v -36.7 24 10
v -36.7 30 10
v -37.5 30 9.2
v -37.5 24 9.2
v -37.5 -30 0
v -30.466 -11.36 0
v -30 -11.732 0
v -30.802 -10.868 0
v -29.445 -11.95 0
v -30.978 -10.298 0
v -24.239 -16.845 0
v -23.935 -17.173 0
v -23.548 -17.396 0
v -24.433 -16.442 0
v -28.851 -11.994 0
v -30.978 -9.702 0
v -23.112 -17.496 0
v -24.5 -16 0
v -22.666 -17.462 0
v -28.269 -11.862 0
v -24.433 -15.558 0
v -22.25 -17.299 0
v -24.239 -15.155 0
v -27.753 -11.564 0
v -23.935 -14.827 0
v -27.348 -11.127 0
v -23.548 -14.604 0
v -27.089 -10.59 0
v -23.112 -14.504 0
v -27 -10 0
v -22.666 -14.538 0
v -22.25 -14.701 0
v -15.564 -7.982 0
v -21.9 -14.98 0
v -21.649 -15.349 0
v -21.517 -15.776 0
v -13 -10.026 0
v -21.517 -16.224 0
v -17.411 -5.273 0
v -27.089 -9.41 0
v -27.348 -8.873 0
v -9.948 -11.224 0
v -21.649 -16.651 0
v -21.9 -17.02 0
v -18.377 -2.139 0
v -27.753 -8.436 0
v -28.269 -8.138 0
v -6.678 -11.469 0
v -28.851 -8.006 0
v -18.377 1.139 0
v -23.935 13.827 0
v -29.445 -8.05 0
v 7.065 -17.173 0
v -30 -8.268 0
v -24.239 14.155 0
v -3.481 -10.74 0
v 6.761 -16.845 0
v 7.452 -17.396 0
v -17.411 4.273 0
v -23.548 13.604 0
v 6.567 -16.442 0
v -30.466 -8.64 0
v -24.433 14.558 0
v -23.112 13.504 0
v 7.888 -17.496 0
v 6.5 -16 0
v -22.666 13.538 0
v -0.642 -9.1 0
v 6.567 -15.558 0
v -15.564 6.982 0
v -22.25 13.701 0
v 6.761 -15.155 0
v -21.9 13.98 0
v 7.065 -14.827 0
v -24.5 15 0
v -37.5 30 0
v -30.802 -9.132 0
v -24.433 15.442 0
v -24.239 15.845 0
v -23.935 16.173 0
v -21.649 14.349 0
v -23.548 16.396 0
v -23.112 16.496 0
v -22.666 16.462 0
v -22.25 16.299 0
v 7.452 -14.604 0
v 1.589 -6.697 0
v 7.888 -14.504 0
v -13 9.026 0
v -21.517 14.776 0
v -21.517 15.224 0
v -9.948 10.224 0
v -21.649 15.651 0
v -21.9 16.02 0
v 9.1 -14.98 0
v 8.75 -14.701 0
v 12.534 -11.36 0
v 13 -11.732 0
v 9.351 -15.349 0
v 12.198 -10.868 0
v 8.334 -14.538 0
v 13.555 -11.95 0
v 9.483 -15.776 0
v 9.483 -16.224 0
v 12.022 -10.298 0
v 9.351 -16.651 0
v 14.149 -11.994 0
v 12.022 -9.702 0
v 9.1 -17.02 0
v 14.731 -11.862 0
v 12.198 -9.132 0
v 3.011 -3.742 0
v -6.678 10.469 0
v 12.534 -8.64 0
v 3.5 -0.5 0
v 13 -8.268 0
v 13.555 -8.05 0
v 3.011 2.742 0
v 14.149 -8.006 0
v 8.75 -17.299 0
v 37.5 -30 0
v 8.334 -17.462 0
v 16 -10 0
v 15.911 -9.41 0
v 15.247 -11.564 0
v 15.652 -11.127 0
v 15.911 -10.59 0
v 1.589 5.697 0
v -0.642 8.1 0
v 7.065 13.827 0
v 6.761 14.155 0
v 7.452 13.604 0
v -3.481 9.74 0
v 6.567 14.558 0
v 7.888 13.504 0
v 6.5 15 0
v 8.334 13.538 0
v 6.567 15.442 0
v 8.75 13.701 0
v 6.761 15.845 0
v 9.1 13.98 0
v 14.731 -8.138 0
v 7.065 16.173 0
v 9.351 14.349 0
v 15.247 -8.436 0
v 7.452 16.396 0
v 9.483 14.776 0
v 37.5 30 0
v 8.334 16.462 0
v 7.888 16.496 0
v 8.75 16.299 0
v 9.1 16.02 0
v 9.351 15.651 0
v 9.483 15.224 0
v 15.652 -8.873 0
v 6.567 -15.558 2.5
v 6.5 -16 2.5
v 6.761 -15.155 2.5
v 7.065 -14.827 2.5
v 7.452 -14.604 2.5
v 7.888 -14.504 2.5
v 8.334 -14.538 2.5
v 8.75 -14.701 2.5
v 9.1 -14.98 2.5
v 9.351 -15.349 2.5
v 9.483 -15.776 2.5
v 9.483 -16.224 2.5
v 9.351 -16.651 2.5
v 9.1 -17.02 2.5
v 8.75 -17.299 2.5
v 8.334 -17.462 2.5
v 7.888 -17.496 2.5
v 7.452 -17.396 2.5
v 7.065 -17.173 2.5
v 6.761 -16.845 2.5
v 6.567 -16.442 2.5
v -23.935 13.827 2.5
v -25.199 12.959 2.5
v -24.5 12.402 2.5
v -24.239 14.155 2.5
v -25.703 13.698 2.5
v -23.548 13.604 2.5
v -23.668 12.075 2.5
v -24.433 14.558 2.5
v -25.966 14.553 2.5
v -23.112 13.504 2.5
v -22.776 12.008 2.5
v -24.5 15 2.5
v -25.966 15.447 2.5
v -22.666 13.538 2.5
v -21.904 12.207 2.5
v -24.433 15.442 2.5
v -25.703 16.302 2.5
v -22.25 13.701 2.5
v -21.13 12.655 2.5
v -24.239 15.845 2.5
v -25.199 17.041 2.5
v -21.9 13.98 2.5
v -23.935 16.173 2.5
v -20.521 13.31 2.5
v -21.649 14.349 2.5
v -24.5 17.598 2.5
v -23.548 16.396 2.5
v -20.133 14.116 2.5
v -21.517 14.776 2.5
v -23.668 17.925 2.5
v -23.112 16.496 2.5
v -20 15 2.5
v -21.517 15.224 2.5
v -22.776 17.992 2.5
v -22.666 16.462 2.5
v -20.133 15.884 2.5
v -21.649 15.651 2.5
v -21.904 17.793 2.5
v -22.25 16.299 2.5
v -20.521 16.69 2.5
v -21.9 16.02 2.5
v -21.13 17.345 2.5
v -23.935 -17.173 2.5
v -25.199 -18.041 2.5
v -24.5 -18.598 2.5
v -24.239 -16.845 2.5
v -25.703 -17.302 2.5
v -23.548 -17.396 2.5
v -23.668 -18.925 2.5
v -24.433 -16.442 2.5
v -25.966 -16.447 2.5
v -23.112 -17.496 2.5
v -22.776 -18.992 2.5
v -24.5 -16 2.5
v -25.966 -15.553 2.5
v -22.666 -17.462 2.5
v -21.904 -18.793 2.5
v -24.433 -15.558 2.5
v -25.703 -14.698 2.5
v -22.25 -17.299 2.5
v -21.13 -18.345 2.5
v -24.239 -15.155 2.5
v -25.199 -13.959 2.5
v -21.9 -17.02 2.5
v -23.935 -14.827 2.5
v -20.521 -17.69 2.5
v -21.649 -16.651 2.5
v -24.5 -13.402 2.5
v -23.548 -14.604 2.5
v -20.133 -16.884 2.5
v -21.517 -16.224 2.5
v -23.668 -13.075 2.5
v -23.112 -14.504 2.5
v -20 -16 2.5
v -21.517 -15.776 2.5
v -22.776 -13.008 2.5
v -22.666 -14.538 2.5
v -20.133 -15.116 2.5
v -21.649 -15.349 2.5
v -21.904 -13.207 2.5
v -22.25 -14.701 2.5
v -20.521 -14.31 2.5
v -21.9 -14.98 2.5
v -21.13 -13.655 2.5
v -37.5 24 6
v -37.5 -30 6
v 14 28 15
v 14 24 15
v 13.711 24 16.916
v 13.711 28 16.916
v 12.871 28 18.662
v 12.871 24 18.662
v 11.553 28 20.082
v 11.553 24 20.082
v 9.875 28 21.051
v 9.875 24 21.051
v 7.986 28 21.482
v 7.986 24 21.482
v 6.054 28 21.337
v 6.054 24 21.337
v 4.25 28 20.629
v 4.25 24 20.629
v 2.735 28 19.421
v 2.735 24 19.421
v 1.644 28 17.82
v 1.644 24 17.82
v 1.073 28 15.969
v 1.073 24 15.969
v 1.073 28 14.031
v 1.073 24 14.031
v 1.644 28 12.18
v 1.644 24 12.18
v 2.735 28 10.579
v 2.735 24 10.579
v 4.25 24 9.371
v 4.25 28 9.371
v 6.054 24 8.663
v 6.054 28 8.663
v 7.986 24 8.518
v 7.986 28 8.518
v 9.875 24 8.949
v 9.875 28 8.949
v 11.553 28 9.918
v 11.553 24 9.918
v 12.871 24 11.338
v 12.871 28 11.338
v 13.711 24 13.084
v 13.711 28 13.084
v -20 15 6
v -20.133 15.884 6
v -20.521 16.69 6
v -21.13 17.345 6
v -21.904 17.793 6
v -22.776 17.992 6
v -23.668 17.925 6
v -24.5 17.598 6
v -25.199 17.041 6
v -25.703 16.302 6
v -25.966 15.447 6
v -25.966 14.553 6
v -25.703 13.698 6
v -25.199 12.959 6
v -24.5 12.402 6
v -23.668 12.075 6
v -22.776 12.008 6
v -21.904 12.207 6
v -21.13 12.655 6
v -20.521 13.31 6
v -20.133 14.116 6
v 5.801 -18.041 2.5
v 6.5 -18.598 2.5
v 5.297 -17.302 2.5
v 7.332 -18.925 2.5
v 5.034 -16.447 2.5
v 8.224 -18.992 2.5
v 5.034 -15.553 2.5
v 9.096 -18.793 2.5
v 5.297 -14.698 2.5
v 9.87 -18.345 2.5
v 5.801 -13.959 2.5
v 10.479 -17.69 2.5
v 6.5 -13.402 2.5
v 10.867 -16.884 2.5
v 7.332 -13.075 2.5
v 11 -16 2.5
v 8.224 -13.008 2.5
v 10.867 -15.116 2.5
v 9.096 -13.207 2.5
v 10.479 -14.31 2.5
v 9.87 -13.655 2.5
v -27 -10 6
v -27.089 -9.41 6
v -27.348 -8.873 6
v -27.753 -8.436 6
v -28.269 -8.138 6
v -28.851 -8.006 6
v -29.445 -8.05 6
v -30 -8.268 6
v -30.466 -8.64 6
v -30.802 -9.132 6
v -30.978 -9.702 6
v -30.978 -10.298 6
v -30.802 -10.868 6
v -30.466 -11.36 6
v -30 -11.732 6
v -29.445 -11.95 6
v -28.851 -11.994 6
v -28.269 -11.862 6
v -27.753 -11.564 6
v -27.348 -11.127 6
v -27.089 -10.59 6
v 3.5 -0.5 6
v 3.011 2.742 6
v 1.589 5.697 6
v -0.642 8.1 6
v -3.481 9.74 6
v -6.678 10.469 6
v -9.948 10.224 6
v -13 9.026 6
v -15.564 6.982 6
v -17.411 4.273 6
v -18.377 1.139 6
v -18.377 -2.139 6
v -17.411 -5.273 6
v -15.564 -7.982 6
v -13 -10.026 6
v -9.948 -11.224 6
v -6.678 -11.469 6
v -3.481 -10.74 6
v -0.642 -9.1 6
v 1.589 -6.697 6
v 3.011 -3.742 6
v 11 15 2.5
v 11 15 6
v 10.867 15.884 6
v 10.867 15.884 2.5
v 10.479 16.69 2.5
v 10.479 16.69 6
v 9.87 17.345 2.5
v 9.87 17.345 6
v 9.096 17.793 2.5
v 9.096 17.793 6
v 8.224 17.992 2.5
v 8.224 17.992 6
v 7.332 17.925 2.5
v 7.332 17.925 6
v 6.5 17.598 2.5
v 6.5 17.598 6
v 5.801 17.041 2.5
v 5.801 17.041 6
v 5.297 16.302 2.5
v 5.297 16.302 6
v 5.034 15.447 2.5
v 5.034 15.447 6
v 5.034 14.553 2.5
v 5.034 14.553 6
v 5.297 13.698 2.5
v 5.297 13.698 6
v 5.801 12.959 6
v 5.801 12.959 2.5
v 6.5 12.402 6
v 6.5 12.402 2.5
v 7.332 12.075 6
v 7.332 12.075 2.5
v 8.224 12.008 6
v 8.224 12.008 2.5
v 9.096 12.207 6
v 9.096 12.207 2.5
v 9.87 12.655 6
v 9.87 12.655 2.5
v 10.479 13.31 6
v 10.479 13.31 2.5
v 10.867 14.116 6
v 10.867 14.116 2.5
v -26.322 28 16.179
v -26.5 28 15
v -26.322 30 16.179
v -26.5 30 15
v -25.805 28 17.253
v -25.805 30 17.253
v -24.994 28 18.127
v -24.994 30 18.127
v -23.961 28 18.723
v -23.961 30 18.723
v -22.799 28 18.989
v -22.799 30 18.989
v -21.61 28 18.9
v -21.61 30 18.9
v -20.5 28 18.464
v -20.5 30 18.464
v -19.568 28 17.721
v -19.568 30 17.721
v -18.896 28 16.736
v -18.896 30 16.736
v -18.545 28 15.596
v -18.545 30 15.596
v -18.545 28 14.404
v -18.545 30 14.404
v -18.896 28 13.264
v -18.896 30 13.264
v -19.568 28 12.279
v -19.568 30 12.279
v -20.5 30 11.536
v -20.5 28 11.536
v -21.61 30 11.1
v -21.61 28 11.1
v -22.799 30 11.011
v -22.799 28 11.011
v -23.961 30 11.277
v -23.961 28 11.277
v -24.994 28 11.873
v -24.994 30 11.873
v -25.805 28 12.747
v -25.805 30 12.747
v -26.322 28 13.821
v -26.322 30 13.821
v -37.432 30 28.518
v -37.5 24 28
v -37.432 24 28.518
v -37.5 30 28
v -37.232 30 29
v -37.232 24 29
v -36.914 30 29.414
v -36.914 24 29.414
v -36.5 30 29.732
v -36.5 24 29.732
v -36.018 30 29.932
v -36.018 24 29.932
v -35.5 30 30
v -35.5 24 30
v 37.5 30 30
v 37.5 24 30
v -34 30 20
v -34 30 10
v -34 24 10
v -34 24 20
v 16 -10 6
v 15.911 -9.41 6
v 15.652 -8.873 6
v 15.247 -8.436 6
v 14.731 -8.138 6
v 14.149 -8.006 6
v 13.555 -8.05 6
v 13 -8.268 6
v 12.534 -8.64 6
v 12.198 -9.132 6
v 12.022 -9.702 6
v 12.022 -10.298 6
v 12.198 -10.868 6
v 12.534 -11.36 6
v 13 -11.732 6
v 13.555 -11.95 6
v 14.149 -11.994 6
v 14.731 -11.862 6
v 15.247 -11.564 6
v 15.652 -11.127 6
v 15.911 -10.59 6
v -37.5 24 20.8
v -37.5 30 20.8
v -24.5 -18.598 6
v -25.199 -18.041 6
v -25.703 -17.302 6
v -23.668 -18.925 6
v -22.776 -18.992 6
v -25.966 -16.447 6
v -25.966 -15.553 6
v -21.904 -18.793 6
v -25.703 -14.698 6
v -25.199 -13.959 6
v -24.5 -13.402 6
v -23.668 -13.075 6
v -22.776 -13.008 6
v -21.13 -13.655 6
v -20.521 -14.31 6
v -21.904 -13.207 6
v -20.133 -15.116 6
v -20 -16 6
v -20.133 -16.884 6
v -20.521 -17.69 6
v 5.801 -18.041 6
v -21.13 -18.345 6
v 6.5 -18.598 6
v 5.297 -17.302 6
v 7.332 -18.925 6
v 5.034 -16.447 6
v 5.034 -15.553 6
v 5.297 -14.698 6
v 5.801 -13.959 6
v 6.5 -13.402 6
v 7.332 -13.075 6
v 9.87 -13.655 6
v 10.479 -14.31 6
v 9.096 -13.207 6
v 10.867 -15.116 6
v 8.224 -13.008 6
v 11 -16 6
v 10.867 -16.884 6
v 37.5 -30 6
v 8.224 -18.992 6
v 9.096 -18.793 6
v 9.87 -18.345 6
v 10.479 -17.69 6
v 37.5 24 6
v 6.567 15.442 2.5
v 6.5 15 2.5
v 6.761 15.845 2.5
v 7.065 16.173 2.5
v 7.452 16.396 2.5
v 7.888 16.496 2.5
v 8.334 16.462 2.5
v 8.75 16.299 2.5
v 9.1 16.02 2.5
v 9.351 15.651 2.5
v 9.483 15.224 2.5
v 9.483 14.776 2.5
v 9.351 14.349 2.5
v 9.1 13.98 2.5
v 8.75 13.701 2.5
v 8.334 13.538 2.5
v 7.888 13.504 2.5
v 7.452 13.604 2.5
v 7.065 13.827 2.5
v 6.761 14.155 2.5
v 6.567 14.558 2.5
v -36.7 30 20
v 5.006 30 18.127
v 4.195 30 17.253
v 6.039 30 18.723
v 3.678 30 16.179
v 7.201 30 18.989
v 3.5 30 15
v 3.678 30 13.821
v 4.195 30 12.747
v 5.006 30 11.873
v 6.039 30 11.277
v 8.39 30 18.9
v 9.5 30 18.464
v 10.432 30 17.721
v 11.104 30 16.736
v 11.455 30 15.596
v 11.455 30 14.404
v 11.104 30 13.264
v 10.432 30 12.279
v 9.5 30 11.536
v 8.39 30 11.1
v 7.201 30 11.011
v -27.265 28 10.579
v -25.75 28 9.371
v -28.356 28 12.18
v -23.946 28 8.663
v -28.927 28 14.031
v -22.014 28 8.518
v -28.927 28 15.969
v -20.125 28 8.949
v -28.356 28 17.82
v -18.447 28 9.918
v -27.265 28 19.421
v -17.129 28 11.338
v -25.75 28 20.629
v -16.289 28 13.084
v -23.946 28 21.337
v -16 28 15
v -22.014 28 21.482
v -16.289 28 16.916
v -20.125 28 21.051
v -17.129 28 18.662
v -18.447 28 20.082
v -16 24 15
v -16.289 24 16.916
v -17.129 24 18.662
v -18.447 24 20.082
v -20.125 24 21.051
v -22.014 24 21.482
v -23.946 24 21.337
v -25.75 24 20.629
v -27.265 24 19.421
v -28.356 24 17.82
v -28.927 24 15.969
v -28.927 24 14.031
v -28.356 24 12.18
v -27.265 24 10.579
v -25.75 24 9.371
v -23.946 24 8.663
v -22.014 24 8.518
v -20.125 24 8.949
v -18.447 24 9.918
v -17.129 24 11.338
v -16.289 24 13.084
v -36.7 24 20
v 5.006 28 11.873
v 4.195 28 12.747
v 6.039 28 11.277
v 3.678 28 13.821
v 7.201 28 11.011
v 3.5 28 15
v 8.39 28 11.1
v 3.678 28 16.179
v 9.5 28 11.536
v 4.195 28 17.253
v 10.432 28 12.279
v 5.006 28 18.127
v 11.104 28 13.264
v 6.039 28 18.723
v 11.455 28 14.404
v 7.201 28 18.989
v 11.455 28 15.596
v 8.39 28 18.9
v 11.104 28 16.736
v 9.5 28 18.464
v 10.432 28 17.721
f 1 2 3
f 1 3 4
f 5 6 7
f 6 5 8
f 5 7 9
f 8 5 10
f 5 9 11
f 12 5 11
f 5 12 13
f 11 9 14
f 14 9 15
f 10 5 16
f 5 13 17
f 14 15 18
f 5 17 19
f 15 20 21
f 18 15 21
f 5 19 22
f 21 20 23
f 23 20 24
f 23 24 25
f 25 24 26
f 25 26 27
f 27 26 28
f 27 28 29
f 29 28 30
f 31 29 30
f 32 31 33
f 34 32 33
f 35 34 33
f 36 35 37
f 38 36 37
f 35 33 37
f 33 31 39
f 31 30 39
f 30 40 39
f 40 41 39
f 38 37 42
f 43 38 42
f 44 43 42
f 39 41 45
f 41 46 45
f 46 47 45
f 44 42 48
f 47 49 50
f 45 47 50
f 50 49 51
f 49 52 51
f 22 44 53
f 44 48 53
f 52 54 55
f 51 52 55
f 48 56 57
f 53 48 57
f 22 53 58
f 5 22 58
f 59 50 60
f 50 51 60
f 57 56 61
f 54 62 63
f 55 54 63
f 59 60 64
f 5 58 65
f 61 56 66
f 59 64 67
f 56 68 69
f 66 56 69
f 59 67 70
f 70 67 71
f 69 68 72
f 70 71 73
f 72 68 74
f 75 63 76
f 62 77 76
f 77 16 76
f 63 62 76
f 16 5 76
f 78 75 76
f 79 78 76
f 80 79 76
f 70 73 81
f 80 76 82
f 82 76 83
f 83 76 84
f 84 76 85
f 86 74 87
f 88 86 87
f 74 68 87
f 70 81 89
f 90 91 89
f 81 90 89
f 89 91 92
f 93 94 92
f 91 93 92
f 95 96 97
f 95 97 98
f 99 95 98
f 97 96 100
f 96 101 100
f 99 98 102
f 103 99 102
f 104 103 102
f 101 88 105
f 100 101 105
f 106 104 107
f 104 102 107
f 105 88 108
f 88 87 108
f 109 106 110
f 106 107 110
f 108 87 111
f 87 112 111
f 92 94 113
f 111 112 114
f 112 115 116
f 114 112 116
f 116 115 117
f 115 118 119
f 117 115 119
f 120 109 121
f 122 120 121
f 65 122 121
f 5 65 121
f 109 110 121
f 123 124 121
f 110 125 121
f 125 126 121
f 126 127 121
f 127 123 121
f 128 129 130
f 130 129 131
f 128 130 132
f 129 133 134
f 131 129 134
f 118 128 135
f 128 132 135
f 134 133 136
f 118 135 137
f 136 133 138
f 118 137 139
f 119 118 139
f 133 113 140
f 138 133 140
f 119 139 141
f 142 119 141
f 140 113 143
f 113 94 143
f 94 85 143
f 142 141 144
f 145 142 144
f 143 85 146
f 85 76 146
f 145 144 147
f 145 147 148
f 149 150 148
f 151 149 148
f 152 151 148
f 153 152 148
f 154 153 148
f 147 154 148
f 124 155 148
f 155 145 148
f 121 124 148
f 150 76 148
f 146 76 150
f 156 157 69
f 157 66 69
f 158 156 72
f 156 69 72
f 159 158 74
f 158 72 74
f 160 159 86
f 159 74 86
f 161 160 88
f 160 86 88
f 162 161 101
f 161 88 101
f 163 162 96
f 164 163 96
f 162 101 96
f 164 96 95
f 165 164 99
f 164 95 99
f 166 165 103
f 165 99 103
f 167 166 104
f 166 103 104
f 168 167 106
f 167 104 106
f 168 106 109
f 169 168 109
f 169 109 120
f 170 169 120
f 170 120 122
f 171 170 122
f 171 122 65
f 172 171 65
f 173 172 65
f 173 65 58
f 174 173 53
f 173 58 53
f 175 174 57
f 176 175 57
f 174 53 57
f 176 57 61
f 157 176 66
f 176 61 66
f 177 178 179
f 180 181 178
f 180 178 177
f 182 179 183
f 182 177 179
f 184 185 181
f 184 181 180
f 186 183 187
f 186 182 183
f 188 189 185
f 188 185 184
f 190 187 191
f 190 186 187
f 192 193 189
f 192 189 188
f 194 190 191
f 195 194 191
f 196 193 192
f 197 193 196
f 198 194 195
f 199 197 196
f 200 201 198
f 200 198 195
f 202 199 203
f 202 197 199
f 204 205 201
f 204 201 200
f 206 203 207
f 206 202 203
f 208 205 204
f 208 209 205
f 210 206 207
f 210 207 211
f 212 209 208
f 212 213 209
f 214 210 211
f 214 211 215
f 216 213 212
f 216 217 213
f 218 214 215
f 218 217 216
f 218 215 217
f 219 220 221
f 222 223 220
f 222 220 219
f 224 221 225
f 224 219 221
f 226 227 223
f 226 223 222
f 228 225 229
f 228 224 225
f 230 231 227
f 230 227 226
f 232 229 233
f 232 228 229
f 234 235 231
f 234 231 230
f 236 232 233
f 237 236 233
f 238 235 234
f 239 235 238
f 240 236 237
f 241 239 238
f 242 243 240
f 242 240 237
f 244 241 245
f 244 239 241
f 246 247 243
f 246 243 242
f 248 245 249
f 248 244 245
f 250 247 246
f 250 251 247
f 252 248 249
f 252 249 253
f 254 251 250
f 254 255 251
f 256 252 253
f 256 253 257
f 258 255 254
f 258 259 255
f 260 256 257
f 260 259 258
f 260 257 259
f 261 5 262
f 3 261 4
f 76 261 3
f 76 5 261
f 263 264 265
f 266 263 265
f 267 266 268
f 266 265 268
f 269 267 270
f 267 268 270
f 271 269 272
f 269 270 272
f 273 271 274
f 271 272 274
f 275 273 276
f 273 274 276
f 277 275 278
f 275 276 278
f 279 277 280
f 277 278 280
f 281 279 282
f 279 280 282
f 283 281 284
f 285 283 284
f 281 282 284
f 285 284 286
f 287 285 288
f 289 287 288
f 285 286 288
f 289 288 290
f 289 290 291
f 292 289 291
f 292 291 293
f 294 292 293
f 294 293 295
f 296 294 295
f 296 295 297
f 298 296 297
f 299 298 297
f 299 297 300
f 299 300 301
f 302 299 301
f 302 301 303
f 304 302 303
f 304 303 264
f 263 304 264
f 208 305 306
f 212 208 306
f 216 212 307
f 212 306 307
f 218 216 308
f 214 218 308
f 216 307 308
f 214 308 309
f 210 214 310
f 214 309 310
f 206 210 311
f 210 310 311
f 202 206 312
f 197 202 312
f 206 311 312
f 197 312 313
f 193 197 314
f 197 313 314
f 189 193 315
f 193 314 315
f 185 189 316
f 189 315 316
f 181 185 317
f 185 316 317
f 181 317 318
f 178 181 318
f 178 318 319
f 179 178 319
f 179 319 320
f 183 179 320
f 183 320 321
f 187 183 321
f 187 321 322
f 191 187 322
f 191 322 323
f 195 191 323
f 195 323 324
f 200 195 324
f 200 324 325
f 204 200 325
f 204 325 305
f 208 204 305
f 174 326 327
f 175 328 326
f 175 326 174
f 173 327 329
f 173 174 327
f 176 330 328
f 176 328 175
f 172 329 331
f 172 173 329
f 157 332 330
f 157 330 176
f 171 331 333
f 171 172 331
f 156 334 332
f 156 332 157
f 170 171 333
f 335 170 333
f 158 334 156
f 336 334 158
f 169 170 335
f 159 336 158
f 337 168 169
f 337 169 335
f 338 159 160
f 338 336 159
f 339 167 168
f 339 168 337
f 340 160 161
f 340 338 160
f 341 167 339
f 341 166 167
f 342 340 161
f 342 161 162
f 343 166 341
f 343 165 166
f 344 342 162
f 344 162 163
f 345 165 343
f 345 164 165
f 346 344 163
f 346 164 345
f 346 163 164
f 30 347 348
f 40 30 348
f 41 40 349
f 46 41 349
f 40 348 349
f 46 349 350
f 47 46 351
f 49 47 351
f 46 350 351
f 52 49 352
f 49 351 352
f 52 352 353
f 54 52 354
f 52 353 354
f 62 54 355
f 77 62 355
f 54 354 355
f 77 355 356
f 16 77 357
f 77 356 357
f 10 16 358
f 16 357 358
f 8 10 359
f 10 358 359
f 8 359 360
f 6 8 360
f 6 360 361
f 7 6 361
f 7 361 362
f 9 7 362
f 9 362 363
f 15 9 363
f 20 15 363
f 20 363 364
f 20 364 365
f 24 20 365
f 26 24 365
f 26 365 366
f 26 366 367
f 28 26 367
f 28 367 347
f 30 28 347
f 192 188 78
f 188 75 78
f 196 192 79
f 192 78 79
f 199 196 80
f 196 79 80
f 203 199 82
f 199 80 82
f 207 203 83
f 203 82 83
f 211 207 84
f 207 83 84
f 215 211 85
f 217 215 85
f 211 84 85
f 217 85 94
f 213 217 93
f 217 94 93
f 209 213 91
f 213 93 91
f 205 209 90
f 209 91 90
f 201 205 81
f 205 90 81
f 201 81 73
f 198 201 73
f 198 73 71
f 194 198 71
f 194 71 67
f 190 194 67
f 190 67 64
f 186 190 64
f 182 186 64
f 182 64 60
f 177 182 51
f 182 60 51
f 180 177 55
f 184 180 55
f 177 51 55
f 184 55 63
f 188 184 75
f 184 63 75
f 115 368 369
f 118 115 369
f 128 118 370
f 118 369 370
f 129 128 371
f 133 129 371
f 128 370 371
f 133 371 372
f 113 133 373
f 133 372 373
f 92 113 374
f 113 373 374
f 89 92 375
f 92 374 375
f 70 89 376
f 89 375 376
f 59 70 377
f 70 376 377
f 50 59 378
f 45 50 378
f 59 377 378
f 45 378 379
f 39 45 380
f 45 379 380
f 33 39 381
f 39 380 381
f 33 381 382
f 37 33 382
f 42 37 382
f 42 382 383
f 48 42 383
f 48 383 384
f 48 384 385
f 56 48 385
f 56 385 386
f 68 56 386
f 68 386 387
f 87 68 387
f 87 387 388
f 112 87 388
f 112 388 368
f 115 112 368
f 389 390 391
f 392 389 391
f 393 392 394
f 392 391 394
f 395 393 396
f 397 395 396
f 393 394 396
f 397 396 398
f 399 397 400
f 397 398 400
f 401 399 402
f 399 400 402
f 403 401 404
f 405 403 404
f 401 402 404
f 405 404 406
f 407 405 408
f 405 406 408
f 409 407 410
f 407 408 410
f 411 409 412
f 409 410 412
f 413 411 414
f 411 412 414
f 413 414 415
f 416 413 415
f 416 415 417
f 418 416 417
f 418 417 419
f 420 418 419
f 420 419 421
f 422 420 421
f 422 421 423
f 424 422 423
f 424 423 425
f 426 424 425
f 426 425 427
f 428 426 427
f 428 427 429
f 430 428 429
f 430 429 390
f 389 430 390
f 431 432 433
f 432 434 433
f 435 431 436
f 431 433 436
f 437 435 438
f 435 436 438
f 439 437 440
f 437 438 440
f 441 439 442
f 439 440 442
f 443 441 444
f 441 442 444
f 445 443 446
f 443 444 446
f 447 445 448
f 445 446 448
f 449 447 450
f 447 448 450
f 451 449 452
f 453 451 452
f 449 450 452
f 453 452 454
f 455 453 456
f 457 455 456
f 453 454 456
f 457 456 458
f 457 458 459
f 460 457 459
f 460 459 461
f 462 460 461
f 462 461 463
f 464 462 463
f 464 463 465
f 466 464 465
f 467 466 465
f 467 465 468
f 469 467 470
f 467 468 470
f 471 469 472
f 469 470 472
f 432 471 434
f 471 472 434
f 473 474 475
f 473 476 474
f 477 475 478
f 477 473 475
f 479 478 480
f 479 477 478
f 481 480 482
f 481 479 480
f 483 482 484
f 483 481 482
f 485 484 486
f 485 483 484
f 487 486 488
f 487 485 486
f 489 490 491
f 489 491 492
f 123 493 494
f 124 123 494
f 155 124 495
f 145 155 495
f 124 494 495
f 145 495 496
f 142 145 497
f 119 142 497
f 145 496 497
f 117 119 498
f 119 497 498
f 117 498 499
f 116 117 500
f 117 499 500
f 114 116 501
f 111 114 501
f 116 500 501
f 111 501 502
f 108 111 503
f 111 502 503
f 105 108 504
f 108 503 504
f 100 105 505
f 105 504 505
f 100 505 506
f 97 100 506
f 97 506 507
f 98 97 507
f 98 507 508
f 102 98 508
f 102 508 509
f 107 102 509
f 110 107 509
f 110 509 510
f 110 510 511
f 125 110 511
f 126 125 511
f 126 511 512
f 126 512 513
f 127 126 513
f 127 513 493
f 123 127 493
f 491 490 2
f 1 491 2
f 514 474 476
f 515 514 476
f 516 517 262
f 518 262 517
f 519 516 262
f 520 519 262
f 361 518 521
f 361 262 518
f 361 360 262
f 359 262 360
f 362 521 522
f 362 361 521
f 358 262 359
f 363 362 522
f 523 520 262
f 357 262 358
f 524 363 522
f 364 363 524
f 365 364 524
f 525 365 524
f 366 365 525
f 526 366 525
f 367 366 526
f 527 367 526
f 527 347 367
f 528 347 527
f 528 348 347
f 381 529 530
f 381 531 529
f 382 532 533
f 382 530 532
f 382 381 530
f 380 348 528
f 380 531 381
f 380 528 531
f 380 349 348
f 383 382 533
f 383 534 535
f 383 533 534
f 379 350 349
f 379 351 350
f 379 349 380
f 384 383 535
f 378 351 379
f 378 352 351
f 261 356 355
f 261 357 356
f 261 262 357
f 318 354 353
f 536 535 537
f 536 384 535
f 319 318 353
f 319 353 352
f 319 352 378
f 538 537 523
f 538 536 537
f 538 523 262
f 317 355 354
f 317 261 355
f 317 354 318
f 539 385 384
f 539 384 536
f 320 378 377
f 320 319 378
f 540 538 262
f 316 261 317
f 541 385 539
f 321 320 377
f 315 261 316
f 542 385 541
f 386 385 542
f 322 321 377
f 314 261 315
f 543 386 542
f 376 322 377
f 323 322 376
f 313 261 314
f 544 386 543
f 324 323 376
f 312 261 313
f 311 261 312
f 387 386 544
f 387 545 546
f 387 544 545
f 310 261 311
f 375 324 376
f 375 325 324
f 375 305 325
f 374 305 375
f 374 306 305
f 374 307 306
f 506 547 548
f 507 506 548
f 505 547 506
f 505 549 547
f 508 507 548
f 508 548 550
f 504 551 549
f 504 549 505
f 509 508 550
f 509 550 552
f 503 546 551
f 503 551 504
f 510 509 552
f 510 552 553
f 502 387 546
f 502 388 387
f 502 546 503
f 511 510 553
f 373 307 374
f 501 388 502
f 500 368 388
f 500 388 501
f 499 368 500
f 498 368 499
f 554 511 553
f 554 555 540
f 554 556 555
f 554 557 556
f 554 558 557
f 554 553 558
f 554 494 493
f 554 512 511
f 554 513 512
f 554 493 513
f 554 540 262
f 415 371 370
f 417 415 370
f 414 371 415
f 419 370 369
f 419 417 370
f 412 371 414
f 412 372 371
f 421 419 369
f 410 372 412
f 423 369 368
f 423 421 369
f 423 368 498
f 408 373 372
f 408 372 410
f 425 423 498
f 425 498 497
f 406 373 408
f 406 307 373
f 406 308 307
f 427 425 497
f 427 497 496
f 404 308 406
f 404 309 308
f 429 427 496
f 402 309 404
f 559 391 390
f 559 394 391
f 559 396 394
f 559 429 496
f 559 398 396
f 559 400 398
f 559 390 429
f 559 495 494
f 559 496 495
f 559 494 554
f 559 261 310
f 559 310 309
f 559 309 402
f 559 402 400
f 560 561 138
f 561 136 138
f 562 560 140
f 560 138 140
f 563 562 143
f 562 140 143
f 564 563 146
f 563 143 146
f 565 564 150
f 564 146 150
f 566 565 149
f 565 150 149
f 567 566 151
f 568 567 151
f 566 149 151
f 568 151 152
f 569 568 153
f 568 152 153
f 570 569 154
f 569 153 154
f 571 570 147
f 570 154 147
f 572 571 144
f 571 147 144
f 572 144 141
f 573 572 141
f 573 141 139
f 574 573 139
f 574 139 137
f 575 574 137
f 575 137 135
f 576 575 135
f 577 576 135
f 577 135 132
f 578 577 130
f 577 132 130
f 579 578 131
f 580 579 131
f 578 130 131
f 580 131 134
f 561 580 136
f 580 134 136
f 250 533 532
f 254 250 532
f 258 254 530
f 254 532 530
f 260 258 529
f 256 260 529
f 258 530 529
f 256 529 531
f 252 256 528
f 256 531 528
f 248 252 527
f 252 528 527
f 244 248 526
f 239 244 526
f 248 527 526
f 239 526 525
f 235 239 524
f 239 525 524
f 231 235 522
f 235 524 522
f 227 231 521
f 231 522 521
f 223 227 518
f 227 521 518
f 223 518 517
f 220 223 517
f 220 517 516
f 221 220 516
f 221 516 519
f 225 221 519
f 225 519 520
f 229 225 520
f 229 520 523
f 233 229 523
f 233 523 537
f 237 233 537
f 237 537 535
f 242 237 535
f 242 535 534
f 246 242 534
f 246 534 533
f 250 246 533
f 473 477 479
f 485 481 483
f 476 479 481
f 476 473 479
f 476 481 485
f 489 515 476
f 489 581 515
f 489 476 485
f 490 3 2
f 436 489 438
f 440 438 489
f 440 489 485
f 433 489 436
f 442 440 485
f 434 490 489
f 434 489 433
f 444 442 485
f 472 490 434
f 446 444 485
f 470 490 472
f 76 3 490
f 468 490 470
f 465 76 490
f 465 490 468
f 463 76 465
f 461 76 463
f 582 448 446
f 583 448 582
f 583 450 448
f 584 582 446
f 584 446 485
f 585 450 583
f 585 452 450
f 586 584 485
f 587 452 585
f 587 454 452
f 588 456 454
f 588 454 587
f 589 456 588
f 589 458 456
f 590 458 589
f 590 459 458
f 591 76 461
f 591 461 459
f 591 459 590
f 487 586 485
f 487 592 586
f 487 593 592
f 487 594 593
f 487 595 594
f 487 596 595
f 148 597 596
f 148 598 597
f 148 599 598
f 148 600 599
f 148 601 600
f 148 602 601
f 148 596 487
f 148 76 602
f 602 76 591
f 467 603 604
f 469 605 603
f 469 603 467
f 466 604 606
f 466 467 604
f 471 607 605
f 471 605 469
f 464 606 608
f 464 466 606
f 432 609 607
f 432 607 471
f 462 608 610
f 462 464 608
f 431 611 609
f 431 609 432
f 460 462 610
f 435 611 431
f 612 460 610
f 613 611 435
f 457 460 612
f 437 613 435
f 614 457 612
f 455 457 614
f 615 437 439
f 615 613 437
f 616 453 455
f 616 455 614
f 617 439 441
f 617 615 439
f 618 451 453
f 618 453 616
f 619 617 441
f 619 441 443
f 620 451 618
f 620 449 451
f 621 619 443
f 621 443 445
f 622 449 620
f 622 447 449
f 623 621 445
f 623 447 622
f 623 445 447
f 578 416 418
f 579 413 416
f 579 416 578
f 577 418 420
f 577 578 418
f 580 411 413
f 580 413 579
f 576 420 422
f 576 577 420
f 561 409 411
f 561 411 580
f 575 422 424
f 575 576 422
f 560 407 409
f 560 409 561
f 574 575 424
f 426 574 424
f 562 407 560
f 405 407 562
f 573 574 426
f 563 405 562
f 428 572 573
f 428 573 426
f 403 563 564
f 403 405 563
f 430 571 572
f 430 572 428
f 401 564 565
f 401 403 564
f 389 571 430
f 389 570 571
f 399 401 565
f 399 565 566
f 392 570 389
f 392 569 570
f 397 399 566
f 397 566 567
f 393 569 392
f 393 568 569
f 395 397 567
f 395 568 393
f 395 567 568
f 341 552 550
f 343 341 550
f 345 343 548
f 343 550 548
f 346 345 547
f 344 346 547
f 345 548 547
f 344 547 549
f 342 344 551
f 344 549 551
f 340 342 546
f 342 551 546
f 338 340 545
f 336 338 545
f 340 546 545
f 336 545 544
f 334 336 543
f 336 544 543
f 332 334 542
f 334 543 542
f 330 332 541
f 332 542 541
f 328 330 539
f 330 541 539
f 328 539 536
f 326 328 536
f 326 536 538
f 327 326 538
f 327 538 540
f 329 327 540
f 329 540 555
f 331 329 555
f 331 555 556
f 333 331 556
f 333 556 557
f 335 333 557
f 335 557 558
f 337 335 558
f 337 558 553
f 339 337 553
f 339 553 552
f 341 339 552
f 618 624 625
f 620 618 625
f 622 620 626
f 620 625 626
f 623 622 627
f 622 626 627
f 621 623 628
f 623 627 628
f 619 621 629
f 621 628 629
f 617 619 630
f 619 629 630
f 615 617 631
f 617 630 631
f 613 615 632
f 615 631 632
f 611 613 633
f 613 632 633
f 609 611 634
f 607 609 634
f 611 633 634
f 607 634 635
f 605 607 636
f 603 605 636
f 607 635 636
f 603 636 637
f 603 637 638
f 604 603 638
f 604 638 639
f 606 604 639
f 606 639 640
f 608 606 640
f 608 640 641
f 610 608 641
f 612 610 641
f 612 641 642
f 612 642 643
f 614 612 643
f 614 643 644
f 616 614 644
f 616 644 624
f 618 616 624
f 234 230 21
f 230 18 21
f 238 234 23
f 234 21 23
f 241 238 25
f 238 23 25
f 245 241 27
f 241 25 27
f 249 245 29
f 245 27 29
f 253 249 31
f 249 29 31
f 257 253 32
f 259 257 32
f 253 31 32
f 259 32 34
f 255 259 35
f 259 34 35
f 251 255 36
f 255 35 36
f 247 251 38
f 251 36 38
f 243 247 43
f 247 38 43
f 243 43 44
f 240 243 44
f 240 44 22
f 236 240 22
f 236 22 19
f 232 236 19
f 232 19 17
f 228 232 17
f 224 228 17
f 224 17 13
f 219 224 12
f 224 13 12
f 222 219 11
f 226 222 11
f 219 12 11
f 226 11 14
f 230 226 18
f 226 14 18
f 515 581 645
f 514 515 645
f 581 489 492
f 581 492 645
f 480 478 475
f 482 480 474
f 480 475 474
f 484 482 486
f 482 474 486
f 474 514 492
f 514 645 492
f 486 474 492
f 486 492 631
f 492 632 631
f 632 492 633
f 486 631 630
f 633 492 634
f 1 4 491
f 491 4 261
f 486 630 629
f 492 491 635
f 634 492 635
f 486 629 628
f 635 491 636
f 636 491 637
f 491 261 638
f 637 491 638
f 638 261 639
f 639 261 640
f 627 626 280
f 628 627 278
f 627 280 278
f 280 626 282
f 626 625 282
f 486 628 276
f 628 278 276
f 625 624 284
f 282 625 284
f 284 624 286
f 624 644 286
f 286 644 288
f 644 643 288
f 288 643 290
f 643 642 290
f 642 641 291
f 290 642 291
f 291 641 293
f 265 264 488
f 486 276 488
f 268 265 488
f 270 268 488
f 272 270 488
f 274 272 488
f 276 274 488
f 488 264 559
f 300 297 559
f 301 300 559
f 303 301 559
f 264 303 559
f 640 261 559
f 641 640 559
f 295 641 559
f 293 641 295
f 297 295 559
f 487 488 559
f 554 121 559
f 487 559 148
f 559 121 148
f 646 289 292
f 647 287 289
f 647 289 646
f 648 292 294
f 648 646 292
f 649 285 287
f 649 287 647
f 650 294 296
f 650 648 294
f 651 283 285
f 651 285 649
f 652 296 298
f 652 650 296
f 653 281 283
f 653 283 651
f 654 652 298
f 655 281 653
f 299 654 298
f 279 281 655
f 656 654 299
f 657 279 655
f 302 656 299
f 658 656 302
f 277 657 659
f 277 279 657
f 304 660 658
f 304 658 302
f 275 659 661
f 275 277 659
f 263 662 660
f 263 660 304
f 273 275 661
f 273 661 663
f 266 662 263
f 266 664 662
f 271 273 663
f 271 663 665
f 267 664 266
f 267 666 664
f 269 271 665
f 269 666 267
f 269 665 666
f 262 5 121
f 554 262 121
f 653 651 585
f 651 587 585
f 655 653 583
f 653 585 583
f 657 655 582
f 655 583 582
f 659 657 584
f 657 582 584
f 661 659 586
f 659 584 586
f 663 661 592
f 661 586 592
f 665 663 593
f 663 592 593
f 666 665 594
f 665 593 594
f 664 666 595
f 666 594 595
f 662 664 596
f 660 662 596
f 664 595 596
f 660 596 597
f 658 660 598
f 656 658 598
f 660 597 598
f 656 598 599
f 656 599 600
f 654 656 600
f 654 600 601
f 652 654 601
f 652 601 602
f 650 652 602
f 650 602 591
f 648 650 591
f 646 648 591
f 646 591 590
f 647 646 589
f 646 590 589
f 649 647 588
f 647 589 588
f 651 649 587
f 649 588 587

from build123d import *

# Parameters (mm, degrees)
F0_W           = 75
F0_H           = 60
F1_DEPTH       = 6
F2_W           = 75
F2_H           = 6
F3_DEPTH       = 24
F5_D           = 3
F5_CBORE_D     = 6
F5_CBORE_DEPTH = 3.5
F4_R           = 11
F6_DEPTH       = 6.001
F4_R_2         = 2
F7_DEPTH       = 6.001
F9_D           = 8
F9_CBORE_D     = 13
F9_CBORE_DEPTH = 4
F10_W          = 3.5
F10_H          = 10
F11_DEPTH      = 60.001
F12_SIZE       = 0.8
F13_R          = 2


with BuildPart() as f1:
    # F0 (on Top) → F1 (new body)
    with BuildSketch(Plane.XY):
        Rectangle(F0_W, F0_H)
    extrude(amount=F1_DEPTH)

    # F2 (on face) → F3 (join)
    with BuildSketch(Plane.XY.offset(6)):
        with Locations((0, 27)):
            Rectangle(F2_W, F2_H)
    extrude(amount=F3_DEPTH)

    # F5 (through all)
    with Locations(Plane.XY.offset(6)):
        with Locations((-23, 15), (8, 15), (8, -16), (-23, -16)):
            CounterBoreHole(F5_D / 2, F5_CBORE_D / 2, F5_CBORE_DEPTH)

    # F4 (on face) → F6 (cut, through all)
    with BuildSketch(Plane.XY.offset(6)):
        with Locations((-7.5, -0.5)):
            Circle(F4_R)
    extrude(amount=-F6_DEPTH, mode=Mode.SUBTRACT)

    # F4 (on face) → F7 (cut, through all)
    with BuildSketch(Plane.XY.offset(6)):
        with Locations((-29, -10)):
            Circle(F4_R_2)
        with Locations((14, -10)):
            Circle(F4_R_2)
    extrude(amount=-F7_DEPTH, mode=Mode.SUBTRACT)

    # F9 (through all)
    with Locations(Plane.XZ.offset(-24)):
        with Locations((-22.5, 15), (7.5, 15)):
            CounterBoreHole(F9_D / 2, F9_CBORE_D / 2, F9_CBORE_DEPTH)

    # F10 (on face) → F11 (cut, through all)
    with BuildSketch(Plane(origin=(0, 30, 0), x_dir=(-1, 0, 0), z_dir=(0, 1, 0))):
        with Locations((35.75, 15)):
            Rectangle(F10_W, F10_H)
    extrude(amount=-F11_DEPTH, mode=Mode.SUBTRACT)

    # F12
    f12_edges = [f1.edges().sort_by_distance(p)[0] for p in [
        (-37.5, 27, 20),
        (-37.5, 27, 10),
    ]]
    chamfer(f12_edges, length=F12_SIZE)

    # F13
    f13_edges = [f1.edges().sort_by_distance(p)[0] for p in [
        (-37.5, 27, 30),
    ]]
    fillet(f13_edges, radius=F13_R)


solid = f1.part
